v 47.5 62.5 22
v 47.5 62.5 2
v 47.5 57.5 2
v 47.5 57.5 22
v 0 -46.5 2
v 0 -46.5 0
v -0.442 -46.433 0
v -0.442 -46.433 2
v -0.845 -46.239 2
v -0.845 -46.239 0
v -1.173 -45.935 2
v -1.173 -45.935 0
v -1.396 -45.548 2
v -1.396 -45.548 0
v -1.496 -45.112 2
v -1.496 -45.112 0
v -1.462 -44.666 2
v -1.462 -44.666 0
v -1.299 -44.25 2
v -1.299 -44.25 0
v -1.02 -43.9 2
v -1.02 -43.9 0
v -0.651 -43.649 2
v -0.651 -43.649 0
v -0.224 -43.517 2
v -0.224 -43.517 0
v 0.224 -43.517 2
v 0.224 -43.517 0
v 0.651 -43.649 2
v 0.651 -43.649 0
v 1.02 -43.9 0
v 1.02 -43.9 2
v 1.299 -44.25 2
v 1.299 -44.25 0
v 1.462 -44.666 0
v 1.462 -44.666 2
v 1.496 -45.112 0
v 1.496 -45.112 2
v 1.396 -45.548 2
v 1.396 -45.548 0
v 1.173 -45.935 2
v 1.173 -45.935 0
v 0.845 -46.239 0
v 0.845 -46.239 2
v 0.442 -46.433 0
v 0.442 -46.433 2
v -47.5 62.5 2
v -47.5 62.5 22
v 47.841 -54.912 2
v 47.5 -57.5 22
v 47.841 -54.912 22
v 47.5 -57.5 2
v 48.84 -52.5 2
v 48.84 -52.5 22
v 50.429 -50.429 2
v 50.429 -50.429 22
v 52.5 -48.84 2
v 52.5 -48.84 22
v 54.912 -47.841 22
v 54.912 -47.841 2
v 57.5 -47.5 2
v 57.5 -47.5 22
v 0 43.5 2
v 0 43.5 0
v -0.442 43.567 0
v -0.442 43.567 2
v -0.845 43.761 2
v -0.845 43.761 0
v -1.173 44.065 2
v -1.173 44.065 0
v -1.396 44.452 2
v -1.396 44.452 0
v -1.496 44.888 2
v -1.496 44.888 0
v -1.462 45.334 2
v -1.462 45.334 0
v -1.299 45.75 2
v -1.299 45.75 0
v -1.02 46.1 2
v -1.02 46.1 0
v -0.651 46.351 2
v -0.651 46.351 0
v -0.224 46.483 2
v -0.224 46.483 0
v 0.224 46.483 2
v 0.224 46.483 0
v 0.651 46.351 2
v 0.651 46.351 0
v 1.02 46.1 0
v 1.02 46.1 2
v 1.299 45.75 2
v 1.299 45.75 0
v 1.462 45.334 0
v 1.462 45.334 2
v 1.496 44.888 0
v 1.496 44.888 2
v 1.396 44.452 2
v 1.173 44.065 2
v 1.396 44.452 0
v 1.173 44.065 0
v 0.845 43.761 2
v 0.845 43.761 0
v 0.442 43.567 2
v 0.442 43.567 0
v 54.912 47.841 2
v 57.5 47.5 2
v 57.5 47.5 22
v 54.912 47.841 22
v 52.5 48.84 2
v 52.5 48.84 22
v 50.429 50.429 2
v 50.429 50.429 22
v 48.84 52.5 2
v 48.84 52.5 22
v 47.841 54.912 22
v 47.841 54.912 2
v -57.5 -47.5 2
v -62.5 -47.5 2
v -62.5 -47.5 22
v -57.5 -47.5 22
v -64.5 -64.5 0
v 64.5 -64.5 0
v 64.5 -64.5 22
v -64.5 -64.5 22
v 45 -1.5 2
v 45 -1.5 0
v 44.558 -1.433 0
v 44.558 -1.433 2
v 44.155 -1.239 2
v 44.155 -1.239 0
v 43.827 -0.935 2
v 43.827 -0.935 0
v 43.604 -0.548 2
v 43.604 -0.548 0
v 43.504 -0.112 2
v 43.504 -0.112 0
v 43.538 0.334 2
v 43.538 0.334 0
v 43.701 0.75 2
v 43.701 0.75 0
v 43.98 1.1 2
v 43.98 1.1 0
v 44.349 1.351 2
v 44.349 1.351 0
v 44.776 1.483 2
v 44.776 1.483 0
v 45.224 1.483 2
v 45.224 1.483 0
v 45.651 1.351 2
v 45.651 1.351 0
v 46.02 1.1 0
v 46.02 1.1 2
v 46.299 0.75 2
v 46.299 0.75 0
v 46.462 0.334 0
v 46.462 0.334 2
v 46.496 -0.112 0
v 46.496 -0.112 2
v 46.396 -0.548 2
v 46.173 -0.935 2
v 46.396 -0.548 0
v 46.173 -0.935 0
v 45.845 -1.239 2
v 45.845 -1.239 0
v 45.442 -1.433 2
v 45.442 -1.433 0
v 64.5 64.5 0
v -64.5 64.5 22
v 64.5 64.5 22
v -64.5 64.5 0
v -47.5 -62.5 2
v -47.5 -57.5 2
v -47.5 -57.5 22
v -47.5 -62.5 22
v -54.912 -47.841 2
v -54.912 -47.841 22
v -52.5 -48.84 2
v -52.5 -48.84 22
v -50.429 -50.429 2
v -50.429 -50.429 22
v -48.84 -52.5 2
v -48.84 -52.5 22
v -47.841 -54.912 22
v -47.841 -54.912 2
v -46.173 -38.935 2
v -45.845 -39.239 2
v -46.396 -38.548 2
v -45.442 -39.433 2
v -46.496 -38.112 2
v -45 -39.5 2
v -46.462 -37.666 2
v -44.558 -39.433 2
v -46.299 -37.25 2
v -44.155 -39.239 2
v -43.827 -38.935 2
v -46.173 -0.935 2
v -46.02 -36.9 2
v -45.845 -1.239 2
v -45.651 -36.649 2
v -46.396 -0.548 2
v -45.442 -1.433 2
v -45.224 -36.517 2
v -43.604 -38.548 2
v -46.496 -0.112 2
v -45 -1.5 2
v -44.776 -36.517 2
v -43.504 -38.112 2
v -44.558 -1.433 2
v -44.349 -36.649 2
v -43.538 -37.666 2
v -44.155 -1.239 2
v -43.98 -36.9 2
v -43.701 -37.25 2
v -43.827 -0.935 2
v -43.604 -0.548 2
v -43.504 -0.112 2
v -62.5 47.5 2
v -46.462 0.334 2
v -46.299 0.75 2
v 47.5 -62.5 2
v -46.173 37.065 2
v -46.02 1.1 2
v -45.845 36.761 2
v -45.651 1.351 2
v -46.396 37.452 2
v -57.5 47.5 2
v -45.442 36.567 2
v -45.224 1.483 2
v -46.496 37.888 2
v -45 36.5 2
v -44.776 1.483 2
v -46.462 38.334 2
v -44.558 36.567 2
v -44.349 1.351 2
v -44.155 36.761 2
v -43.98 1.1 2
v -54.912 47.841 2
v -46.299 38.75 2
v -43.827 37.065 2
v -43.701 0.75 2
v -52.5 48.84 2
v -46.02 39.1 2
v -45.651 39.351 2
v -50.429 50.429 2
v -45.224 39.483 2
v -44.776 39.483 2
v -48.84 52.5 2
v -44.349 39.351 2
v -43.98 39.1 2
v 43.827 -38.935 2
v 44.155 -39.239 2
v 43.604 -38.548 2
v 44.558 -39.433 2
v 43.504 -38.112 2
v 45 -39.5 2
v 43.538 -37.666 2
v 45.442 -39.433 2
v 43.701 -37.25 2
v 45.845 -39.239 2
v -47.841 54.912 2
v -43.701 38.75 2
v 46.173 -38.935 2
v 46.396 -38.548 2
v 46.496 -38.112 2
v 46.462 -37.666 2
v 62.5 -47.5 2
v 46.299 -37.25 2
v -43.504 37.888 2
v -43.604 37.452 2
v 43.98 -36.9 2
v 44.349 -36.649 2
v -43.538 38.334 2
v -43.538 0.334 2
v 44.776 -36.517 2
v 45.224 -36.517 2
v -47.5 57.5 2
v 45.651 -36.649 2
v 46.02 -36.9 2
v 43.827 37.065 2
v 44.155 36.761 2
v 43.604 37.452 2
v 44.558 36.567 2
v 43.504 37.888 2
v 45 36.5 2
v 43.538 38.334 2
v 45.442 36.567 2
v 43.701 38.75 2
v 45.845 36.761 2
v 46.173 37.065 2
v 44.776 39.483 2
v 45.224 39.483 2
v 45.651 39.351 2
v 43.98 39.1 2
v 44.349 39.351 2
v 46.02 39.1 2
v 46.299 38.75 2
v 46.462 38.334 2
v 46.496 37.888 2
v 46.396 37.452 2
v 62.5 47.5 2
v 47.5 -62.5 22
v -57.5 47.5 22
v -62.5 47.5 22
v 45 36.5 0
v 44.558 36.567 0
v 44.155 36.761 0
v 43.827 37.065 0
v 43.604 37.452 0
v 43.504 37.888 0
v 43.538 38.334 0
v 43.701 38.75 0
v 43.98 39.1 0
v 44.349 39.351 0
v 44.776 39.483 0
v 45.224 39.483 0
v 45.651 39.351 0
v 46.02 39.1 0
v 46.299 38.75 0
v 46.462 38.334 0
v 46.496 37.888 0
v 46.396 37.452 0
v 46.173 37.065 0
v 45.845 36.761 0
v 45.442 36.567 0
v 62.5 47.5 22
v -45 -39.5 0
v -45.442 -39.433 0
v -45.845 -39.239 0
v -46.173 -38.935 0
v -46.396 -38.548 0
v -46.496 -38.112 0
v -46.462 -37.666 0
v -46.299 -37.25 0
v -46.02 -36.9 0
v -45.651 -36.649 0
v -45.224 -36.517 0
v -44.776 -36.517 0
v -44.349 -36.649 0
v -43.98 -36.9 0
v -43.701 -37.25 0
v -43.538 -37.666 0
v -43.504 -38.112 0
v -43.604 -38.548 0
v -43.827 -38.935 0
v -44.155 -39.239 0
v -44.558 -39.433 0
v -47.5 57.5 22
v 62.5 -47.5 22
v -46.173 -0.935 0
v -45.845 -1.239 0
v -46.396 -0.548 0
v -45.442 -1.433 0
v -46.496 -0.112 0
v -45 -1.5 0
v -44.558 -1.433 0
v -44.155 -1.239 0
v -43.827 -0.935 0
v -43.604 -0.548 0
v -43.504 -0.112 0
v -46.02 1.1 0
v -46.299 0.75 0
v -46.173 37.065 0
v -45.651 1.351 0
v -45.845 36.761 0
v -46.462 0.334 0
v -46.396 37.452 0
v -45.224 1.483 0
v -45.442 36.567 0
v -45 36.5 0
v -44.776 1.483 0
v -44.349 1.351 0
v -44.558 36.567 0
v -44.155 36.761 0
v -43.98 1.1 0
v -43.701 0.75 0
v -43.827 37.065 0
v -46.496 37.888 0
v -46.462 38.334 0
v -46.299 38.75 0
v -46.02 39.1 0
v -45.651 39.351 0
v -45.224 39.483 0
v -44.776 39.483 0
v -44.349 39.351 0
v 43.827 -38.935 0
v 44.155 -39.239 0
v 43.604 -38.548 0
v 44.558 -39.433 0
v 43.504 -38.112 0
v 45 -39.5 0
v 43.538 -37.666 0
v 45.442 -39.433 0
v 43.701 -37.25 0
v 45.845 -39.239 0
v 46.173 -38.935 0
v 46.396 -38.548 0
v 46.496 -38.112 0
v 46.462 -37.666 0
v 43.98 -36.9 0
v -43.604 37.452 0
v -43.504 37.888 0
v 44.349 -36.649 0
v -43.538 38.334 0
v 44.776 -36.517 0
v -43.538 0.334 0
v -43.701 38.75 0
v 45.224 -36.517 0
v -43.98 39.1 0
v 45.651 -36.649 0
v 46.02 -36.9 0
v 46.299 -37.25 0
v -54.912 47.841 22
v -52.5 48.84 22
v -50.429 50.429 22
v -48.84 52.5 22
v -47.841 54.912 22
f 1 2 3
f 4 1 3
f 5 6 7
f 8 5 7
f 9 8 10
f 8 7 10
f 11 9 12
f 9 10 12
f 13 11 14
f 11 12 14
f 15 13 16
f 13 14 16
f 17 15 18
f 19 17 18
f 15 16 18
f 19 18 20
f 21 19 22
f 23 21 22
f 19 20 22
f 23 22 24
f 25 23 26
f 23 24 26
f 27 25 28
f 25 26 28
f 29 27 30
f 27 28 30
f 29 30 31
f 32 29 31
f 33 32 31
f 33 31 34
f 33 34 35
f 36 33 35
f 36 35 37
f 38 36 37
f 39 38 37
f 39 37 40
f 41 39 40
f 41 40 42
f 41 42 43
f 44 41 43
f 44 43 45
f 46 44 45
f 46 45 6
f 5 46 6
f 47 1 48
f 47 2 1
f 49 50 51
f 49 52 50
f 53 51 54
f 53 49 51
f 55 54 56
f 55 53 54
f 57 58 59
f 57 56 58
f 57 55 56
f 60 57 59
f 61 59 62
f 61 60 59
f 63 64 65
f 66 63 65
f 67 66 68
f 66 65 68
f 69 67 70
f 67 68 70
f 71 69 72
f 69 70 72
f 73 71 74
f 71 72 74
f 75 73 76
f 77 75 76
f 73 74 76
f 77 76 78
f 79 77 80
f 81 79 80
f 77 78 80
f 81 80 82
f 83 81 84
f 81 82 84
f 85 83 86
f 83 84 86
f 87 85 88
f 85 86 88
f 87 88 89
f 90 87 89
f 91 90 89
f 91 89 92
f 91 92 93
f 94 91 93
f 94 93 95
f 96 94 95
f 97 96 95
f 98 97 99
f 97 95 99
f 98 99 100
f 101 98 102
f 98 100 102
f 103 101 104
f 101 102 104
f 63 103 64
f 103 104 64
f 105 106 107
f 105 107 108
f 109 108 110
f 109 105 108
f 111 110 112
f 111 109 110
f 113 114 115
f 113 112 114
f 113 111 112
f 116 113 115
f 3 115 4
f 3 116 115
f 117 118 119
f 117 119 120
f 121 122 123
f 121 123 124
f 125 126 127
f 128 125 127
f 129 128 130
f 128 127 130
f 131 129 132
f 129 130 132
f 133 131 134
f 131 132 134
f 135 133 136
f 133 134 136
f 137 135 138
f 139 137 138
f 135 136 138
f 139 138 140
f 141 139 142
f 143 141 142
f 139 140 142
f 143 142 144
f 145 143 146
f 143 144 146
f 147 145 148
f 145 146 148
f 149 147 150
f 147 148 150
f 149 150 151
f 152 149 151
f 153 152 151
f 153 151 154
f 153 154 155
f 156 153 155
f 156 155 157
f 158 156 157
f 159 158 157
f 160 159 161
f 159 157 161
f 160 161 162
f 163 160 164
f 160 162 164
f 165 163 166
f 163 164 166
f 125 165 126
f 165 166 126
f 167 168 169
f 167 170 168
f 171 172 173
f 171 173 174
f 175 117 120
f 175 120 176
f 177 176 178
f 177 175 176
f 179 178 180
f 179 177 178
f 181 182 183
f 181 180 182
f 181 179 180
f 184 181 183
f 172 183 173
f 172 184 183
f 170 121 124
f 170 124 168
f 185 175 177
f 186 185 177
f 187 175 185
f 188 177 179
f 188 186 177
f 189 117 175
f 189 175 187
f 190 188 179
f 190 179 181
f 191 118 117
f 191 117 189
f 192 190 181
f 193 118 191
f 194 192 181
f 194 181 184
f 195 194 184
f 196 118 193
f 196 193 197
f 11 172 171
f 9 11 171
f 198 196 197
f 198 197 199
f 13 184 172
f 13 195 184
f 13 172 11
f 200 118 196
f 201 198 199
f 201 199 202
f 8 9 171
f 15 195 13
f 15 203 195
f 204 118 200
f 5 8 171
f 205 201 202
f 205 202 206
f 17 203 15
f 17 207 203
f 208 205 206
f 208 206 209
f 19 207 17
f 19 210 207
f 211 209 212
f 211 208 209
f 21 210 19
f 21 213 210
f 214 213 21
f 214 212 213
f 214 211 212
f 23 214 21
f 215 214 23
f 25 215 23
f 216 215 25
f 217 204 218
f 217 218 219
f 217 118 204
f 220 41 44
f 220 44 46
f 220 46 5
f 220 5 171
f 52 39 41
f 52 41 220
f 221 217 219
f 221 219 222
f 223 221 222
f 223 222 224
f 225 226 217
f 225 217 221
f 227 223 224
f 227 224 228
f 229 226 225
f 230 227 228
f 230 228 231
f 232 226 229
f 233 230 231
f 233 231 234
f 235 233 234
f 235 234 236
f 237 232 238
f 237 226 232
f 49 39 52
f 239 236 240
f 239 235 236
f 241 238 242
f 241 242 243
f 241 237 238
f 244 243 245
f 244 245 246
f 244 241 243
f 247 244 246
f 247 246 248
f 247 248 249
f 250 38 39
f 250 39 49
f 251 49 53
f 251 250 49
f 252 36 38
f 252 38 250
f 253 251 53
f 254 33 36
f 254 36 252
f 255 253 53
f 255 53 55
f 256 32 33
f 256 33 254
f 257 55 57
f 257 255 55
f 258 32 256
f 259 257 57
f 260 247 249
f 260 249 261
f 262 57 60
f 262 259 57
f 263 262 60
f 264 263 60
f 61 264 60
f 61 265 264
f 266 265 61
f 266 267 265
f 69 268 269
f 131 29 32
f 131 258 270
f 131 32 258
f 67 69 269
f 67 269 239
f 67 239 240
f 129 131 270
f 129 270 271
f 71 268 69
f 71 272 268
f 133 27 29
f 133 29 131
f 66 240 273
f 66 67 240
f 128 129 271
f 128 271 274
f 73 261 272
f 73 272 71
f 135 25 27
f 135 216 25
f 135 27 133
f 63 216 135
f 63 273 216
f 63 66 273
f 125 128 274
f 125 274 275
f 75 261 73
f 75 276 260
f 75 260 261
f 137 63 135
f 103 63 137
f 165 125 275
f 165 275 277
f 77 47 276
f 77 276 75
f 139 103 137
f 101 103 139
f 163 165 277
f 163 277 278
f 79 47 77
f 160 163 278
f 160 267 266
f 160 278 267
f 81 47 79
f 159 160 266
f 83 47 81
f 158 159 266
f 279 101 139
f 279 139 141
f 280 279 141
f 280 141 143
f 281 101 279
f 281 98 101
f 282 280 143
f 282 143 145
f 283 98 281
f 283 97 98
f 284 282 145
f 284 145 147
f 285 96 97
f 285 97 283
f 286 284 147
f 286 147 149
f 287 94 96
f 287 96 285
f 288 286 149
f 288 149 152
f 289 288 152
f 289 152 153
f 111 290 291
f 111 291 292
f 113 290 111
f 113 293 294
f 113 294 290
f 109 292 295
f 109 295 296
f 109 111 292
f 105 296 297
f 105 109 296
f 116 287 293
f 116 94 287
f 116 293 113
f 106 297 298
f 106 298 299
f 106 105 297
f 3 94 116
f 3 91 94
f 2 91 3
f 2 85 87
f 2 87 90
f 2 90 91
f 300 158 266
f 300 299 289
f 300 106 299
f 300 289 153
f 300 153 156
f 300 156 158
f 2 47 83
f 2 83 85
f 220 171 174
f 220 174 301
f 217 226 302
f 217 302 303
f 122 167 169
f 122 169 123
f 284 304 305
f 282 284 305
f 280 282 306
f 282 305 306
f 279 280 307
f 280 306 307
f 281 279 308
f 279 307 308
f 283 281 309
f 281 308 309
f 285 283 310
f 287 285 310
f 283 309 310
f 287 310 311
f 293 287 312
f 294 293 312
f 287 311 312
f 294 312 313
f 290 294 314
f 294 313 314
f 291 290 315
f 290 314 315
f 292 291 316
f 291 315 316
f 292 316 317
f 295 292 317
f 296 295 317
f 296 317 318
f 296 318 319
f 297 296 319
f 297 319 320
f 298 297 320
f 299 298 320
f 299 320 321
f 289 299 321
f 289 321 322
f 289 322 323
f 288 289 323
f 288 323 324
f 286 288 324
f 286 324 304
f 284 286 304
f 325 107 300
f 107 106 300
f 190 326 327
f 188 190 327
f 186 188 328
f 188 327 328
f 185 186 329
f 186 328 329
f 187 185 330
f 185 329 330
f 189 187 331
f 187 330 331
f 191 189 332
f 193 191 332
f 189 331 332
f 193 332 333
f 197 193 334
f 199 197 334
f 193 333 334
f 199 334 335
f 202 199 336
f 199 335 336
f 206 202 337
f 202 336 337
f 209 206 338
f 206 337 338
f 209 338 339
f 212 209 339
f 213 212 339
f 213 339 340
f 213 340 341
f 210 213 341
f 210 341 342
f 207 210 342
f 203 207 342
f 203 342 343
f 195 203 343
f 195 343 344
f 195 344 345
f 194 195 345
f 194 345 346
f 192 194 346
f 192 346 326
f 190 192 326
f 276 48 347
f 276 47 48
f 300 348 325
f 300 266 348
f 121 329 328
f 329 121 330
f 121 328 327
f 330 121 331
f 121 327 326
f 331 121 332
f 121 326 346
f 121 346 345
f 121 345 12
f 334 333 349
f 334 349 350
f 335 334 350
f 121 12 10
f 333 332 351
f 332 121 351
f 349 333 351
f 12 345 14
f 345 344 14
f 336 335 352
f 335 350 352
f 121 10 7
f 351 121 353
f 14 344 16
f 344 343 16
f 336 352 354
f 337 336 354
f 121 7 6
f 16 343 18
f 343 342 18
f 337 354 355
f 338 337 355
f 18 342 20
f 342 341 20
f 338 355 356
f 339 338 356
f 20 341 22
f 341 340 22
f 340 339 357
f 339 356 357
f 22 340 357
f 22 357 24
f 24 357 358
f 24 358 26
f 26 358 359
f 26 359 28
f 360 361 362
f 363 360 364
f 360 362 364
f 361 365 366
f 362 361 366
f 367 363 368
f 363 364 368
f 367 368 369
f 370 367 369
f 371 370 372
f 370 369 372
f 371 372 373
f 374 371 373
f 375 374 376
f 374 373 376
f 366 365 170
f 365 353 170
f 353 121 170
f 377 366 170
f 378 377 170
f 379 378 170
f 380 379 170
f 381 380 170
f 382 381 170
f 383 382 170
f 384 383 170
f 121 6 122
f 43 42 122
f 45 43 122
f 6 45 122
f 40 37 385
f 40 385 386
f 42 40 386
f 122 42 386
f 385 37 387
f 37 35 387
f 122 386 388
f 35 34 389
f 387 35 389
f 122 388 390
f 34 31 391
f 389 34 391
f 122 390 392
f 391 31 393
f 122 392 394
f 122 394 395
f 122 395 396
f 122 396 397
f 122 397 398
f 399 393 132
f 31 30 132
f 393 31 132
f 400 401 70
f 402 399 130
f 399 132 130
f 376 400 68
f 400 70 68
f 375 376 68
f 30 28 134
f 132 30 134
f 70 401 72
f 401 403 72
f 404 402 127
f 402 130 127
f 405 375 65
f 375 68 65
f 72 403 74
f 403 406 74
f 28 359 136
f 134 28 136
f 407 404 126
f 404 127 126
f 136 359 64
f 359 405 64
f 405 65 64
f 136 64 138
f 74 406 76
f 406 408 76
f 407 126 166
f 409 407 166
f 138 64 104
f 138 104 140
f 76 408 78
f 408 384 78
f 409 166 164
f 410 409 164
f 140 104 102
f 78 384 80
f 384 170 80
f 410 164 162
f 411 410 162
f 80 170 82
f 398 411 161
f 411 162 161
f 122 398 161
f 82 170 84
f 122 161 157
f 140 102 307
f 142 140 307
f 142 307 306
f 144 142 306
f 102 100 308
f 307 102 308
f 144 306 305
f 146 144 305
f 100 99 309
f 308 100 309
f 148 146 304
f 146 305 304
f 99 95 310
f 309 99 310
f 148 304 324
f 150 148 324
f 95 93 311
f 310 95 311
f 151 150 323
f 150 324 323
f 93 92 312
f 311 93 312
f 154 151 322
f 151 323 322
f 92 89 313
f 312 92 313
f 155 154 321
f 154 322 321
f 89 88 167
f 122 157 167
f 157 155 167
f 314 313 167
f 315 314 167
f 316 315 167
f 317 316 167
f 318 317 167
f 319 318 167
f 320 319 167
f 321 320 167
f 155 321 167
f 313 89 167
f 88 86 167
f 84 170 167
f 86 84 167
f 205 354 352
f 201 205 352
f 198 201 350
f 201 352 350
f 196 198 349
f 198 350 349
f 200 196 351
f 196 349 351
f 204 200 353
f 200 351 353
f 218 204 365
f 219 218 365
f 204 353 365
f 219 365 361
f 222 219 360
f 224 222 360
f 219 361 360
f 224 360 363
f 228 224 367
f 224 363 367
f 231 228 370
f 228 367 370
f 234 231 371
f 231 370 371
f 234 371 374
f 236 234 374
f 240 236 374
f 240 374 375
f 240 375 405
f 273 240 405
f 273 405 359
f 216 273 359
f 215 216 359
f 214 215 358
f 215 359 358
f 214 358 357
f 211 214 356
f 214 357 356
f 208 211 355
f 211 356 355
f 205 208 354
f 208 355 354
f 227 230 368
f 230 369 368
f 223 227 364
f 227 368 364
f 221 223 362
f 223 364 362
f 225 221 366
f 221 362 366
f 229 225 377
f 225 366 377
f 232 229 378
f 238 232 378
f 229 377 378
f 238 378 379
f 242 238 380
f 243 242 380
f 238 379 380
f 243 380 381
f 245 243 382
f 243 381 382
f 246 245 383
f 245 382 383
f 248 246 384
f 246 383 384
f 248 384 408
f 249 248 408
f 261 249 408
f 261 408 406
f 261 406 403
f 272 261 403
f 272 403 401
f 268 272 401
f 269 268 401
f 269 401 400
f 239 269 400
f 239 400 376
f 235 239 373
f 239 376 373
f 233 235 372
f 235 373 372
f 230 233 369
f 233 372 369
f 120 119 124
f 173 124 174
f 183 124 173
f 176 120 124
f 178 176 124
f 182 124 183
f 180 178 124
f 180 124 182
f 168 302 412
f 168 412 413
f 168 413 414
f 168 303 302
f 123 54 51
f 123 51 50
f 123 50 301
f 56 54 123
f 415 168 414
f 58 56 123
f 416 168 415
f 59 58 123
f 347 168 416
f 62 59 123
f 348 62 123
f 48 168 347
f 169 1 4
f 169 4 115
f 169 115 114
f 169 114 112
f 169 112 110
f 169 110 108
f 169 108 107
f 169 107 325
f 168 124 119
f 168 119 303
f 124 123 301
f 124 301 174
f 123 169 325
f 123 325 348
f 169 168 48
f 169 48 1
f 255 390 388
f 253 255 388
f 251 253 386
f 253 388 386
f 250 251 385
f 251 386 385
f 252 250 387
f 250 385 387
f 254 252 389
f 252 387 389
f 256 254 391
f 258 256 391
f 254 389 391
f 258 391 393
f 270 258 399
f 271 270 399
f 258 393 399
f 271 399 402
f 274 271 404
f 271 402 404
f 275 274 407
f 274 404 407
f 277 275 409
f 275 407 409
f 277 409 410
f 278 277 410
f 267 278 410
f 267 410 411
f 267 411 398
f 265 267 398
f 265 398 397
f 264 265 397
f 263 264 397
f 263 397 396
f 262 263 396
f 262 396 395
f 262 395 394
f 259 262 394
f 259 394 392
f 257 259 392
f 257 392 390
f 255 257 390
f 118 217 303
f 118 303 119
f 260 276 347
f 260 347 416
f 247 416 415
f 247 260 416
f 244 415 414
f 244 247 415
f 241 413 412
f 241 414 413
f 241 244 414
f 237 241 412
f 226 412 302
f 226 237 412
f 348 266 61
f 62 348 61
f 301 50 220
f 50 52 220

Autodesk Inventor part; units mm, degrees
ref_plane "YZ Plane" through (0, 0, 0) normal (1, 0, 0) x (0, 1, 0)
ref_plane "XZ Plane" through (0, 0, 0) normal (0, 1, 0) x (-1, 0, 0)
ref_plane "XY Plane" through (0, 0, 0) normal (0, 0, 1) x (1, 0, 0)
sketch "Skizze1" plane through (0, 0, 0) normal (0, 0, 1) x (1, 0, 0)
  line L0 (-64.5, 64.5) -> (64.5, 64.5)
  line L1 (64.5, 64.5) -> (64.5, -64.5)
  line L2 (64.5, -64.5) -> (-64.5, -64.5)
  line L3 (-64.5, -64.5) -> (-64.5, 64.5)
  line L4 (-64.5, 64.5) -> (64.5, -64.5) construction
  line L5 (64.5, 64.5) -> (-64.5, -64.5) construction
  point P0 (0, 0)
  dimension "d0" = 129
  dimension "d1" = 129
extrude "Extrusion1" add sketch "Skizze1" along normal blind 2
sketch "Skizze2" plane through (0, 0, 2) normal (0, 0, 1) x (1, 0, 0)
  line L0 (64.5, 64.5) -> (-64.5, 64.5) projected
  line L1 (-64.5, -64.5) -> (64.5, -64.5) projected
  line L2 (-64.5, 64.5) -> (64.5, 64.5)
  line L3 (64.5, 64.5) -> (64.5, -64.5)
  line L4 (64.5, -64.5) -> (-64.5, -64.5)
  line L5 (-64.5, -64.5) -> (-64.5, 64.5)
  line L6 (62.5, -47.5) -> (62.5, 47.5)
  line L7 (47.5, 62.5) -> (-47.5, 62.5)
  line L8 (-62.5, 47.5) -> (-62.5, -47.5)
  line L9 (-47.5, -62.5) -> (47.5, -62.5)
  line L10 (-47.5, 62.5) -> (-47.5, 57.5)
  line L11 (-57.5, 47.5) -> (-62.5, 47.5)
  line L12 (47.5, 62.5) -> (47.5, 57.5)
  line L13 (57.5, 47.5) -> (62.5, 47.5)
  line L14 (62.5, -47.5) -> (57.5, -47.5)
  line L15 (47.5, -57.5) -> (47.5, -62.5)
  line L16 (-62.5, -47.5) -> (-57.5, -47.5)
  line L17 (-47.5, -57.5) -> (-47.5, -62.5)
  arc A0 (-57.5, 47.5) -> (-47.5, 57.5) centre (-57.5, 57.5) ccw
  arc A1 (47.5, 57.5) -> (57.5, 47.5) centre (57.5, 57.5) ccw
  arc A2 (57.5, -47.5) -> (47.5, -57.5) centre (57.5, -57.5) ccw
  arc A3 (-47.5, -57.5) -> (-57.5, -47.5) centre (-57.5, -57.5) ccw
  point P0 (0, 0)
  point P1 (47.5, 47.5)
  point P2 (47.5, -47.5)
  point P3 (-47.5, -47.5)
  dimension "d4" = 2
  dimension "d5" = 17
  dimension "d8" = 10
  dimension "d9" = 2
  dimension "d10" = 2
  dimension "d11" = 2
extrude "Extrusion2" add sketch "Skizze2" along normal blind 20
sketch "Skizze3" plane through (0, 0, 2) normal (0, 0, 1) x (1, 0, 0)
  line L0 (-45, 38) -> (45, 38)
  line L1 (45, 38) -> (45, -38)
  line L2 (45, -38) -> (-45, -38)
  line L3 (-45, -38) -> (-45, 38)
  line L4 (-45, 38) -> (45, -38) construction
  line L5 (45, 38) -> (-45, -38) construction
  line L6 (64.5, 64.5) -> (-64.5, 64.5) projected
  line L7 (0, 64.5) -> (0, 45)
  line L8 (0, -45) -> (0, -64.5)
  line L9 (-64.5, -64.5) -> (64.5, -64.5) projected
  point P0 (0, 0)
  point P1 (45, 0)
  point P2 (-45, 0)
  dimension "d14" = 76
  dimension "d15" = 90
  dimension "d16" = 90
hole "Bohrung1" at (-45, 38, 2) at (45, 38, 2) at (45, 0, 2) at (45, -38, 2) at (-45, -38, 2) at (-45, 0, 2) at (0, 45, 2) at (0, -45, 2) direction (0, 0, -1) diameter 3 end through all
properties part number "Gehäuse_Sensor_Dummy"
